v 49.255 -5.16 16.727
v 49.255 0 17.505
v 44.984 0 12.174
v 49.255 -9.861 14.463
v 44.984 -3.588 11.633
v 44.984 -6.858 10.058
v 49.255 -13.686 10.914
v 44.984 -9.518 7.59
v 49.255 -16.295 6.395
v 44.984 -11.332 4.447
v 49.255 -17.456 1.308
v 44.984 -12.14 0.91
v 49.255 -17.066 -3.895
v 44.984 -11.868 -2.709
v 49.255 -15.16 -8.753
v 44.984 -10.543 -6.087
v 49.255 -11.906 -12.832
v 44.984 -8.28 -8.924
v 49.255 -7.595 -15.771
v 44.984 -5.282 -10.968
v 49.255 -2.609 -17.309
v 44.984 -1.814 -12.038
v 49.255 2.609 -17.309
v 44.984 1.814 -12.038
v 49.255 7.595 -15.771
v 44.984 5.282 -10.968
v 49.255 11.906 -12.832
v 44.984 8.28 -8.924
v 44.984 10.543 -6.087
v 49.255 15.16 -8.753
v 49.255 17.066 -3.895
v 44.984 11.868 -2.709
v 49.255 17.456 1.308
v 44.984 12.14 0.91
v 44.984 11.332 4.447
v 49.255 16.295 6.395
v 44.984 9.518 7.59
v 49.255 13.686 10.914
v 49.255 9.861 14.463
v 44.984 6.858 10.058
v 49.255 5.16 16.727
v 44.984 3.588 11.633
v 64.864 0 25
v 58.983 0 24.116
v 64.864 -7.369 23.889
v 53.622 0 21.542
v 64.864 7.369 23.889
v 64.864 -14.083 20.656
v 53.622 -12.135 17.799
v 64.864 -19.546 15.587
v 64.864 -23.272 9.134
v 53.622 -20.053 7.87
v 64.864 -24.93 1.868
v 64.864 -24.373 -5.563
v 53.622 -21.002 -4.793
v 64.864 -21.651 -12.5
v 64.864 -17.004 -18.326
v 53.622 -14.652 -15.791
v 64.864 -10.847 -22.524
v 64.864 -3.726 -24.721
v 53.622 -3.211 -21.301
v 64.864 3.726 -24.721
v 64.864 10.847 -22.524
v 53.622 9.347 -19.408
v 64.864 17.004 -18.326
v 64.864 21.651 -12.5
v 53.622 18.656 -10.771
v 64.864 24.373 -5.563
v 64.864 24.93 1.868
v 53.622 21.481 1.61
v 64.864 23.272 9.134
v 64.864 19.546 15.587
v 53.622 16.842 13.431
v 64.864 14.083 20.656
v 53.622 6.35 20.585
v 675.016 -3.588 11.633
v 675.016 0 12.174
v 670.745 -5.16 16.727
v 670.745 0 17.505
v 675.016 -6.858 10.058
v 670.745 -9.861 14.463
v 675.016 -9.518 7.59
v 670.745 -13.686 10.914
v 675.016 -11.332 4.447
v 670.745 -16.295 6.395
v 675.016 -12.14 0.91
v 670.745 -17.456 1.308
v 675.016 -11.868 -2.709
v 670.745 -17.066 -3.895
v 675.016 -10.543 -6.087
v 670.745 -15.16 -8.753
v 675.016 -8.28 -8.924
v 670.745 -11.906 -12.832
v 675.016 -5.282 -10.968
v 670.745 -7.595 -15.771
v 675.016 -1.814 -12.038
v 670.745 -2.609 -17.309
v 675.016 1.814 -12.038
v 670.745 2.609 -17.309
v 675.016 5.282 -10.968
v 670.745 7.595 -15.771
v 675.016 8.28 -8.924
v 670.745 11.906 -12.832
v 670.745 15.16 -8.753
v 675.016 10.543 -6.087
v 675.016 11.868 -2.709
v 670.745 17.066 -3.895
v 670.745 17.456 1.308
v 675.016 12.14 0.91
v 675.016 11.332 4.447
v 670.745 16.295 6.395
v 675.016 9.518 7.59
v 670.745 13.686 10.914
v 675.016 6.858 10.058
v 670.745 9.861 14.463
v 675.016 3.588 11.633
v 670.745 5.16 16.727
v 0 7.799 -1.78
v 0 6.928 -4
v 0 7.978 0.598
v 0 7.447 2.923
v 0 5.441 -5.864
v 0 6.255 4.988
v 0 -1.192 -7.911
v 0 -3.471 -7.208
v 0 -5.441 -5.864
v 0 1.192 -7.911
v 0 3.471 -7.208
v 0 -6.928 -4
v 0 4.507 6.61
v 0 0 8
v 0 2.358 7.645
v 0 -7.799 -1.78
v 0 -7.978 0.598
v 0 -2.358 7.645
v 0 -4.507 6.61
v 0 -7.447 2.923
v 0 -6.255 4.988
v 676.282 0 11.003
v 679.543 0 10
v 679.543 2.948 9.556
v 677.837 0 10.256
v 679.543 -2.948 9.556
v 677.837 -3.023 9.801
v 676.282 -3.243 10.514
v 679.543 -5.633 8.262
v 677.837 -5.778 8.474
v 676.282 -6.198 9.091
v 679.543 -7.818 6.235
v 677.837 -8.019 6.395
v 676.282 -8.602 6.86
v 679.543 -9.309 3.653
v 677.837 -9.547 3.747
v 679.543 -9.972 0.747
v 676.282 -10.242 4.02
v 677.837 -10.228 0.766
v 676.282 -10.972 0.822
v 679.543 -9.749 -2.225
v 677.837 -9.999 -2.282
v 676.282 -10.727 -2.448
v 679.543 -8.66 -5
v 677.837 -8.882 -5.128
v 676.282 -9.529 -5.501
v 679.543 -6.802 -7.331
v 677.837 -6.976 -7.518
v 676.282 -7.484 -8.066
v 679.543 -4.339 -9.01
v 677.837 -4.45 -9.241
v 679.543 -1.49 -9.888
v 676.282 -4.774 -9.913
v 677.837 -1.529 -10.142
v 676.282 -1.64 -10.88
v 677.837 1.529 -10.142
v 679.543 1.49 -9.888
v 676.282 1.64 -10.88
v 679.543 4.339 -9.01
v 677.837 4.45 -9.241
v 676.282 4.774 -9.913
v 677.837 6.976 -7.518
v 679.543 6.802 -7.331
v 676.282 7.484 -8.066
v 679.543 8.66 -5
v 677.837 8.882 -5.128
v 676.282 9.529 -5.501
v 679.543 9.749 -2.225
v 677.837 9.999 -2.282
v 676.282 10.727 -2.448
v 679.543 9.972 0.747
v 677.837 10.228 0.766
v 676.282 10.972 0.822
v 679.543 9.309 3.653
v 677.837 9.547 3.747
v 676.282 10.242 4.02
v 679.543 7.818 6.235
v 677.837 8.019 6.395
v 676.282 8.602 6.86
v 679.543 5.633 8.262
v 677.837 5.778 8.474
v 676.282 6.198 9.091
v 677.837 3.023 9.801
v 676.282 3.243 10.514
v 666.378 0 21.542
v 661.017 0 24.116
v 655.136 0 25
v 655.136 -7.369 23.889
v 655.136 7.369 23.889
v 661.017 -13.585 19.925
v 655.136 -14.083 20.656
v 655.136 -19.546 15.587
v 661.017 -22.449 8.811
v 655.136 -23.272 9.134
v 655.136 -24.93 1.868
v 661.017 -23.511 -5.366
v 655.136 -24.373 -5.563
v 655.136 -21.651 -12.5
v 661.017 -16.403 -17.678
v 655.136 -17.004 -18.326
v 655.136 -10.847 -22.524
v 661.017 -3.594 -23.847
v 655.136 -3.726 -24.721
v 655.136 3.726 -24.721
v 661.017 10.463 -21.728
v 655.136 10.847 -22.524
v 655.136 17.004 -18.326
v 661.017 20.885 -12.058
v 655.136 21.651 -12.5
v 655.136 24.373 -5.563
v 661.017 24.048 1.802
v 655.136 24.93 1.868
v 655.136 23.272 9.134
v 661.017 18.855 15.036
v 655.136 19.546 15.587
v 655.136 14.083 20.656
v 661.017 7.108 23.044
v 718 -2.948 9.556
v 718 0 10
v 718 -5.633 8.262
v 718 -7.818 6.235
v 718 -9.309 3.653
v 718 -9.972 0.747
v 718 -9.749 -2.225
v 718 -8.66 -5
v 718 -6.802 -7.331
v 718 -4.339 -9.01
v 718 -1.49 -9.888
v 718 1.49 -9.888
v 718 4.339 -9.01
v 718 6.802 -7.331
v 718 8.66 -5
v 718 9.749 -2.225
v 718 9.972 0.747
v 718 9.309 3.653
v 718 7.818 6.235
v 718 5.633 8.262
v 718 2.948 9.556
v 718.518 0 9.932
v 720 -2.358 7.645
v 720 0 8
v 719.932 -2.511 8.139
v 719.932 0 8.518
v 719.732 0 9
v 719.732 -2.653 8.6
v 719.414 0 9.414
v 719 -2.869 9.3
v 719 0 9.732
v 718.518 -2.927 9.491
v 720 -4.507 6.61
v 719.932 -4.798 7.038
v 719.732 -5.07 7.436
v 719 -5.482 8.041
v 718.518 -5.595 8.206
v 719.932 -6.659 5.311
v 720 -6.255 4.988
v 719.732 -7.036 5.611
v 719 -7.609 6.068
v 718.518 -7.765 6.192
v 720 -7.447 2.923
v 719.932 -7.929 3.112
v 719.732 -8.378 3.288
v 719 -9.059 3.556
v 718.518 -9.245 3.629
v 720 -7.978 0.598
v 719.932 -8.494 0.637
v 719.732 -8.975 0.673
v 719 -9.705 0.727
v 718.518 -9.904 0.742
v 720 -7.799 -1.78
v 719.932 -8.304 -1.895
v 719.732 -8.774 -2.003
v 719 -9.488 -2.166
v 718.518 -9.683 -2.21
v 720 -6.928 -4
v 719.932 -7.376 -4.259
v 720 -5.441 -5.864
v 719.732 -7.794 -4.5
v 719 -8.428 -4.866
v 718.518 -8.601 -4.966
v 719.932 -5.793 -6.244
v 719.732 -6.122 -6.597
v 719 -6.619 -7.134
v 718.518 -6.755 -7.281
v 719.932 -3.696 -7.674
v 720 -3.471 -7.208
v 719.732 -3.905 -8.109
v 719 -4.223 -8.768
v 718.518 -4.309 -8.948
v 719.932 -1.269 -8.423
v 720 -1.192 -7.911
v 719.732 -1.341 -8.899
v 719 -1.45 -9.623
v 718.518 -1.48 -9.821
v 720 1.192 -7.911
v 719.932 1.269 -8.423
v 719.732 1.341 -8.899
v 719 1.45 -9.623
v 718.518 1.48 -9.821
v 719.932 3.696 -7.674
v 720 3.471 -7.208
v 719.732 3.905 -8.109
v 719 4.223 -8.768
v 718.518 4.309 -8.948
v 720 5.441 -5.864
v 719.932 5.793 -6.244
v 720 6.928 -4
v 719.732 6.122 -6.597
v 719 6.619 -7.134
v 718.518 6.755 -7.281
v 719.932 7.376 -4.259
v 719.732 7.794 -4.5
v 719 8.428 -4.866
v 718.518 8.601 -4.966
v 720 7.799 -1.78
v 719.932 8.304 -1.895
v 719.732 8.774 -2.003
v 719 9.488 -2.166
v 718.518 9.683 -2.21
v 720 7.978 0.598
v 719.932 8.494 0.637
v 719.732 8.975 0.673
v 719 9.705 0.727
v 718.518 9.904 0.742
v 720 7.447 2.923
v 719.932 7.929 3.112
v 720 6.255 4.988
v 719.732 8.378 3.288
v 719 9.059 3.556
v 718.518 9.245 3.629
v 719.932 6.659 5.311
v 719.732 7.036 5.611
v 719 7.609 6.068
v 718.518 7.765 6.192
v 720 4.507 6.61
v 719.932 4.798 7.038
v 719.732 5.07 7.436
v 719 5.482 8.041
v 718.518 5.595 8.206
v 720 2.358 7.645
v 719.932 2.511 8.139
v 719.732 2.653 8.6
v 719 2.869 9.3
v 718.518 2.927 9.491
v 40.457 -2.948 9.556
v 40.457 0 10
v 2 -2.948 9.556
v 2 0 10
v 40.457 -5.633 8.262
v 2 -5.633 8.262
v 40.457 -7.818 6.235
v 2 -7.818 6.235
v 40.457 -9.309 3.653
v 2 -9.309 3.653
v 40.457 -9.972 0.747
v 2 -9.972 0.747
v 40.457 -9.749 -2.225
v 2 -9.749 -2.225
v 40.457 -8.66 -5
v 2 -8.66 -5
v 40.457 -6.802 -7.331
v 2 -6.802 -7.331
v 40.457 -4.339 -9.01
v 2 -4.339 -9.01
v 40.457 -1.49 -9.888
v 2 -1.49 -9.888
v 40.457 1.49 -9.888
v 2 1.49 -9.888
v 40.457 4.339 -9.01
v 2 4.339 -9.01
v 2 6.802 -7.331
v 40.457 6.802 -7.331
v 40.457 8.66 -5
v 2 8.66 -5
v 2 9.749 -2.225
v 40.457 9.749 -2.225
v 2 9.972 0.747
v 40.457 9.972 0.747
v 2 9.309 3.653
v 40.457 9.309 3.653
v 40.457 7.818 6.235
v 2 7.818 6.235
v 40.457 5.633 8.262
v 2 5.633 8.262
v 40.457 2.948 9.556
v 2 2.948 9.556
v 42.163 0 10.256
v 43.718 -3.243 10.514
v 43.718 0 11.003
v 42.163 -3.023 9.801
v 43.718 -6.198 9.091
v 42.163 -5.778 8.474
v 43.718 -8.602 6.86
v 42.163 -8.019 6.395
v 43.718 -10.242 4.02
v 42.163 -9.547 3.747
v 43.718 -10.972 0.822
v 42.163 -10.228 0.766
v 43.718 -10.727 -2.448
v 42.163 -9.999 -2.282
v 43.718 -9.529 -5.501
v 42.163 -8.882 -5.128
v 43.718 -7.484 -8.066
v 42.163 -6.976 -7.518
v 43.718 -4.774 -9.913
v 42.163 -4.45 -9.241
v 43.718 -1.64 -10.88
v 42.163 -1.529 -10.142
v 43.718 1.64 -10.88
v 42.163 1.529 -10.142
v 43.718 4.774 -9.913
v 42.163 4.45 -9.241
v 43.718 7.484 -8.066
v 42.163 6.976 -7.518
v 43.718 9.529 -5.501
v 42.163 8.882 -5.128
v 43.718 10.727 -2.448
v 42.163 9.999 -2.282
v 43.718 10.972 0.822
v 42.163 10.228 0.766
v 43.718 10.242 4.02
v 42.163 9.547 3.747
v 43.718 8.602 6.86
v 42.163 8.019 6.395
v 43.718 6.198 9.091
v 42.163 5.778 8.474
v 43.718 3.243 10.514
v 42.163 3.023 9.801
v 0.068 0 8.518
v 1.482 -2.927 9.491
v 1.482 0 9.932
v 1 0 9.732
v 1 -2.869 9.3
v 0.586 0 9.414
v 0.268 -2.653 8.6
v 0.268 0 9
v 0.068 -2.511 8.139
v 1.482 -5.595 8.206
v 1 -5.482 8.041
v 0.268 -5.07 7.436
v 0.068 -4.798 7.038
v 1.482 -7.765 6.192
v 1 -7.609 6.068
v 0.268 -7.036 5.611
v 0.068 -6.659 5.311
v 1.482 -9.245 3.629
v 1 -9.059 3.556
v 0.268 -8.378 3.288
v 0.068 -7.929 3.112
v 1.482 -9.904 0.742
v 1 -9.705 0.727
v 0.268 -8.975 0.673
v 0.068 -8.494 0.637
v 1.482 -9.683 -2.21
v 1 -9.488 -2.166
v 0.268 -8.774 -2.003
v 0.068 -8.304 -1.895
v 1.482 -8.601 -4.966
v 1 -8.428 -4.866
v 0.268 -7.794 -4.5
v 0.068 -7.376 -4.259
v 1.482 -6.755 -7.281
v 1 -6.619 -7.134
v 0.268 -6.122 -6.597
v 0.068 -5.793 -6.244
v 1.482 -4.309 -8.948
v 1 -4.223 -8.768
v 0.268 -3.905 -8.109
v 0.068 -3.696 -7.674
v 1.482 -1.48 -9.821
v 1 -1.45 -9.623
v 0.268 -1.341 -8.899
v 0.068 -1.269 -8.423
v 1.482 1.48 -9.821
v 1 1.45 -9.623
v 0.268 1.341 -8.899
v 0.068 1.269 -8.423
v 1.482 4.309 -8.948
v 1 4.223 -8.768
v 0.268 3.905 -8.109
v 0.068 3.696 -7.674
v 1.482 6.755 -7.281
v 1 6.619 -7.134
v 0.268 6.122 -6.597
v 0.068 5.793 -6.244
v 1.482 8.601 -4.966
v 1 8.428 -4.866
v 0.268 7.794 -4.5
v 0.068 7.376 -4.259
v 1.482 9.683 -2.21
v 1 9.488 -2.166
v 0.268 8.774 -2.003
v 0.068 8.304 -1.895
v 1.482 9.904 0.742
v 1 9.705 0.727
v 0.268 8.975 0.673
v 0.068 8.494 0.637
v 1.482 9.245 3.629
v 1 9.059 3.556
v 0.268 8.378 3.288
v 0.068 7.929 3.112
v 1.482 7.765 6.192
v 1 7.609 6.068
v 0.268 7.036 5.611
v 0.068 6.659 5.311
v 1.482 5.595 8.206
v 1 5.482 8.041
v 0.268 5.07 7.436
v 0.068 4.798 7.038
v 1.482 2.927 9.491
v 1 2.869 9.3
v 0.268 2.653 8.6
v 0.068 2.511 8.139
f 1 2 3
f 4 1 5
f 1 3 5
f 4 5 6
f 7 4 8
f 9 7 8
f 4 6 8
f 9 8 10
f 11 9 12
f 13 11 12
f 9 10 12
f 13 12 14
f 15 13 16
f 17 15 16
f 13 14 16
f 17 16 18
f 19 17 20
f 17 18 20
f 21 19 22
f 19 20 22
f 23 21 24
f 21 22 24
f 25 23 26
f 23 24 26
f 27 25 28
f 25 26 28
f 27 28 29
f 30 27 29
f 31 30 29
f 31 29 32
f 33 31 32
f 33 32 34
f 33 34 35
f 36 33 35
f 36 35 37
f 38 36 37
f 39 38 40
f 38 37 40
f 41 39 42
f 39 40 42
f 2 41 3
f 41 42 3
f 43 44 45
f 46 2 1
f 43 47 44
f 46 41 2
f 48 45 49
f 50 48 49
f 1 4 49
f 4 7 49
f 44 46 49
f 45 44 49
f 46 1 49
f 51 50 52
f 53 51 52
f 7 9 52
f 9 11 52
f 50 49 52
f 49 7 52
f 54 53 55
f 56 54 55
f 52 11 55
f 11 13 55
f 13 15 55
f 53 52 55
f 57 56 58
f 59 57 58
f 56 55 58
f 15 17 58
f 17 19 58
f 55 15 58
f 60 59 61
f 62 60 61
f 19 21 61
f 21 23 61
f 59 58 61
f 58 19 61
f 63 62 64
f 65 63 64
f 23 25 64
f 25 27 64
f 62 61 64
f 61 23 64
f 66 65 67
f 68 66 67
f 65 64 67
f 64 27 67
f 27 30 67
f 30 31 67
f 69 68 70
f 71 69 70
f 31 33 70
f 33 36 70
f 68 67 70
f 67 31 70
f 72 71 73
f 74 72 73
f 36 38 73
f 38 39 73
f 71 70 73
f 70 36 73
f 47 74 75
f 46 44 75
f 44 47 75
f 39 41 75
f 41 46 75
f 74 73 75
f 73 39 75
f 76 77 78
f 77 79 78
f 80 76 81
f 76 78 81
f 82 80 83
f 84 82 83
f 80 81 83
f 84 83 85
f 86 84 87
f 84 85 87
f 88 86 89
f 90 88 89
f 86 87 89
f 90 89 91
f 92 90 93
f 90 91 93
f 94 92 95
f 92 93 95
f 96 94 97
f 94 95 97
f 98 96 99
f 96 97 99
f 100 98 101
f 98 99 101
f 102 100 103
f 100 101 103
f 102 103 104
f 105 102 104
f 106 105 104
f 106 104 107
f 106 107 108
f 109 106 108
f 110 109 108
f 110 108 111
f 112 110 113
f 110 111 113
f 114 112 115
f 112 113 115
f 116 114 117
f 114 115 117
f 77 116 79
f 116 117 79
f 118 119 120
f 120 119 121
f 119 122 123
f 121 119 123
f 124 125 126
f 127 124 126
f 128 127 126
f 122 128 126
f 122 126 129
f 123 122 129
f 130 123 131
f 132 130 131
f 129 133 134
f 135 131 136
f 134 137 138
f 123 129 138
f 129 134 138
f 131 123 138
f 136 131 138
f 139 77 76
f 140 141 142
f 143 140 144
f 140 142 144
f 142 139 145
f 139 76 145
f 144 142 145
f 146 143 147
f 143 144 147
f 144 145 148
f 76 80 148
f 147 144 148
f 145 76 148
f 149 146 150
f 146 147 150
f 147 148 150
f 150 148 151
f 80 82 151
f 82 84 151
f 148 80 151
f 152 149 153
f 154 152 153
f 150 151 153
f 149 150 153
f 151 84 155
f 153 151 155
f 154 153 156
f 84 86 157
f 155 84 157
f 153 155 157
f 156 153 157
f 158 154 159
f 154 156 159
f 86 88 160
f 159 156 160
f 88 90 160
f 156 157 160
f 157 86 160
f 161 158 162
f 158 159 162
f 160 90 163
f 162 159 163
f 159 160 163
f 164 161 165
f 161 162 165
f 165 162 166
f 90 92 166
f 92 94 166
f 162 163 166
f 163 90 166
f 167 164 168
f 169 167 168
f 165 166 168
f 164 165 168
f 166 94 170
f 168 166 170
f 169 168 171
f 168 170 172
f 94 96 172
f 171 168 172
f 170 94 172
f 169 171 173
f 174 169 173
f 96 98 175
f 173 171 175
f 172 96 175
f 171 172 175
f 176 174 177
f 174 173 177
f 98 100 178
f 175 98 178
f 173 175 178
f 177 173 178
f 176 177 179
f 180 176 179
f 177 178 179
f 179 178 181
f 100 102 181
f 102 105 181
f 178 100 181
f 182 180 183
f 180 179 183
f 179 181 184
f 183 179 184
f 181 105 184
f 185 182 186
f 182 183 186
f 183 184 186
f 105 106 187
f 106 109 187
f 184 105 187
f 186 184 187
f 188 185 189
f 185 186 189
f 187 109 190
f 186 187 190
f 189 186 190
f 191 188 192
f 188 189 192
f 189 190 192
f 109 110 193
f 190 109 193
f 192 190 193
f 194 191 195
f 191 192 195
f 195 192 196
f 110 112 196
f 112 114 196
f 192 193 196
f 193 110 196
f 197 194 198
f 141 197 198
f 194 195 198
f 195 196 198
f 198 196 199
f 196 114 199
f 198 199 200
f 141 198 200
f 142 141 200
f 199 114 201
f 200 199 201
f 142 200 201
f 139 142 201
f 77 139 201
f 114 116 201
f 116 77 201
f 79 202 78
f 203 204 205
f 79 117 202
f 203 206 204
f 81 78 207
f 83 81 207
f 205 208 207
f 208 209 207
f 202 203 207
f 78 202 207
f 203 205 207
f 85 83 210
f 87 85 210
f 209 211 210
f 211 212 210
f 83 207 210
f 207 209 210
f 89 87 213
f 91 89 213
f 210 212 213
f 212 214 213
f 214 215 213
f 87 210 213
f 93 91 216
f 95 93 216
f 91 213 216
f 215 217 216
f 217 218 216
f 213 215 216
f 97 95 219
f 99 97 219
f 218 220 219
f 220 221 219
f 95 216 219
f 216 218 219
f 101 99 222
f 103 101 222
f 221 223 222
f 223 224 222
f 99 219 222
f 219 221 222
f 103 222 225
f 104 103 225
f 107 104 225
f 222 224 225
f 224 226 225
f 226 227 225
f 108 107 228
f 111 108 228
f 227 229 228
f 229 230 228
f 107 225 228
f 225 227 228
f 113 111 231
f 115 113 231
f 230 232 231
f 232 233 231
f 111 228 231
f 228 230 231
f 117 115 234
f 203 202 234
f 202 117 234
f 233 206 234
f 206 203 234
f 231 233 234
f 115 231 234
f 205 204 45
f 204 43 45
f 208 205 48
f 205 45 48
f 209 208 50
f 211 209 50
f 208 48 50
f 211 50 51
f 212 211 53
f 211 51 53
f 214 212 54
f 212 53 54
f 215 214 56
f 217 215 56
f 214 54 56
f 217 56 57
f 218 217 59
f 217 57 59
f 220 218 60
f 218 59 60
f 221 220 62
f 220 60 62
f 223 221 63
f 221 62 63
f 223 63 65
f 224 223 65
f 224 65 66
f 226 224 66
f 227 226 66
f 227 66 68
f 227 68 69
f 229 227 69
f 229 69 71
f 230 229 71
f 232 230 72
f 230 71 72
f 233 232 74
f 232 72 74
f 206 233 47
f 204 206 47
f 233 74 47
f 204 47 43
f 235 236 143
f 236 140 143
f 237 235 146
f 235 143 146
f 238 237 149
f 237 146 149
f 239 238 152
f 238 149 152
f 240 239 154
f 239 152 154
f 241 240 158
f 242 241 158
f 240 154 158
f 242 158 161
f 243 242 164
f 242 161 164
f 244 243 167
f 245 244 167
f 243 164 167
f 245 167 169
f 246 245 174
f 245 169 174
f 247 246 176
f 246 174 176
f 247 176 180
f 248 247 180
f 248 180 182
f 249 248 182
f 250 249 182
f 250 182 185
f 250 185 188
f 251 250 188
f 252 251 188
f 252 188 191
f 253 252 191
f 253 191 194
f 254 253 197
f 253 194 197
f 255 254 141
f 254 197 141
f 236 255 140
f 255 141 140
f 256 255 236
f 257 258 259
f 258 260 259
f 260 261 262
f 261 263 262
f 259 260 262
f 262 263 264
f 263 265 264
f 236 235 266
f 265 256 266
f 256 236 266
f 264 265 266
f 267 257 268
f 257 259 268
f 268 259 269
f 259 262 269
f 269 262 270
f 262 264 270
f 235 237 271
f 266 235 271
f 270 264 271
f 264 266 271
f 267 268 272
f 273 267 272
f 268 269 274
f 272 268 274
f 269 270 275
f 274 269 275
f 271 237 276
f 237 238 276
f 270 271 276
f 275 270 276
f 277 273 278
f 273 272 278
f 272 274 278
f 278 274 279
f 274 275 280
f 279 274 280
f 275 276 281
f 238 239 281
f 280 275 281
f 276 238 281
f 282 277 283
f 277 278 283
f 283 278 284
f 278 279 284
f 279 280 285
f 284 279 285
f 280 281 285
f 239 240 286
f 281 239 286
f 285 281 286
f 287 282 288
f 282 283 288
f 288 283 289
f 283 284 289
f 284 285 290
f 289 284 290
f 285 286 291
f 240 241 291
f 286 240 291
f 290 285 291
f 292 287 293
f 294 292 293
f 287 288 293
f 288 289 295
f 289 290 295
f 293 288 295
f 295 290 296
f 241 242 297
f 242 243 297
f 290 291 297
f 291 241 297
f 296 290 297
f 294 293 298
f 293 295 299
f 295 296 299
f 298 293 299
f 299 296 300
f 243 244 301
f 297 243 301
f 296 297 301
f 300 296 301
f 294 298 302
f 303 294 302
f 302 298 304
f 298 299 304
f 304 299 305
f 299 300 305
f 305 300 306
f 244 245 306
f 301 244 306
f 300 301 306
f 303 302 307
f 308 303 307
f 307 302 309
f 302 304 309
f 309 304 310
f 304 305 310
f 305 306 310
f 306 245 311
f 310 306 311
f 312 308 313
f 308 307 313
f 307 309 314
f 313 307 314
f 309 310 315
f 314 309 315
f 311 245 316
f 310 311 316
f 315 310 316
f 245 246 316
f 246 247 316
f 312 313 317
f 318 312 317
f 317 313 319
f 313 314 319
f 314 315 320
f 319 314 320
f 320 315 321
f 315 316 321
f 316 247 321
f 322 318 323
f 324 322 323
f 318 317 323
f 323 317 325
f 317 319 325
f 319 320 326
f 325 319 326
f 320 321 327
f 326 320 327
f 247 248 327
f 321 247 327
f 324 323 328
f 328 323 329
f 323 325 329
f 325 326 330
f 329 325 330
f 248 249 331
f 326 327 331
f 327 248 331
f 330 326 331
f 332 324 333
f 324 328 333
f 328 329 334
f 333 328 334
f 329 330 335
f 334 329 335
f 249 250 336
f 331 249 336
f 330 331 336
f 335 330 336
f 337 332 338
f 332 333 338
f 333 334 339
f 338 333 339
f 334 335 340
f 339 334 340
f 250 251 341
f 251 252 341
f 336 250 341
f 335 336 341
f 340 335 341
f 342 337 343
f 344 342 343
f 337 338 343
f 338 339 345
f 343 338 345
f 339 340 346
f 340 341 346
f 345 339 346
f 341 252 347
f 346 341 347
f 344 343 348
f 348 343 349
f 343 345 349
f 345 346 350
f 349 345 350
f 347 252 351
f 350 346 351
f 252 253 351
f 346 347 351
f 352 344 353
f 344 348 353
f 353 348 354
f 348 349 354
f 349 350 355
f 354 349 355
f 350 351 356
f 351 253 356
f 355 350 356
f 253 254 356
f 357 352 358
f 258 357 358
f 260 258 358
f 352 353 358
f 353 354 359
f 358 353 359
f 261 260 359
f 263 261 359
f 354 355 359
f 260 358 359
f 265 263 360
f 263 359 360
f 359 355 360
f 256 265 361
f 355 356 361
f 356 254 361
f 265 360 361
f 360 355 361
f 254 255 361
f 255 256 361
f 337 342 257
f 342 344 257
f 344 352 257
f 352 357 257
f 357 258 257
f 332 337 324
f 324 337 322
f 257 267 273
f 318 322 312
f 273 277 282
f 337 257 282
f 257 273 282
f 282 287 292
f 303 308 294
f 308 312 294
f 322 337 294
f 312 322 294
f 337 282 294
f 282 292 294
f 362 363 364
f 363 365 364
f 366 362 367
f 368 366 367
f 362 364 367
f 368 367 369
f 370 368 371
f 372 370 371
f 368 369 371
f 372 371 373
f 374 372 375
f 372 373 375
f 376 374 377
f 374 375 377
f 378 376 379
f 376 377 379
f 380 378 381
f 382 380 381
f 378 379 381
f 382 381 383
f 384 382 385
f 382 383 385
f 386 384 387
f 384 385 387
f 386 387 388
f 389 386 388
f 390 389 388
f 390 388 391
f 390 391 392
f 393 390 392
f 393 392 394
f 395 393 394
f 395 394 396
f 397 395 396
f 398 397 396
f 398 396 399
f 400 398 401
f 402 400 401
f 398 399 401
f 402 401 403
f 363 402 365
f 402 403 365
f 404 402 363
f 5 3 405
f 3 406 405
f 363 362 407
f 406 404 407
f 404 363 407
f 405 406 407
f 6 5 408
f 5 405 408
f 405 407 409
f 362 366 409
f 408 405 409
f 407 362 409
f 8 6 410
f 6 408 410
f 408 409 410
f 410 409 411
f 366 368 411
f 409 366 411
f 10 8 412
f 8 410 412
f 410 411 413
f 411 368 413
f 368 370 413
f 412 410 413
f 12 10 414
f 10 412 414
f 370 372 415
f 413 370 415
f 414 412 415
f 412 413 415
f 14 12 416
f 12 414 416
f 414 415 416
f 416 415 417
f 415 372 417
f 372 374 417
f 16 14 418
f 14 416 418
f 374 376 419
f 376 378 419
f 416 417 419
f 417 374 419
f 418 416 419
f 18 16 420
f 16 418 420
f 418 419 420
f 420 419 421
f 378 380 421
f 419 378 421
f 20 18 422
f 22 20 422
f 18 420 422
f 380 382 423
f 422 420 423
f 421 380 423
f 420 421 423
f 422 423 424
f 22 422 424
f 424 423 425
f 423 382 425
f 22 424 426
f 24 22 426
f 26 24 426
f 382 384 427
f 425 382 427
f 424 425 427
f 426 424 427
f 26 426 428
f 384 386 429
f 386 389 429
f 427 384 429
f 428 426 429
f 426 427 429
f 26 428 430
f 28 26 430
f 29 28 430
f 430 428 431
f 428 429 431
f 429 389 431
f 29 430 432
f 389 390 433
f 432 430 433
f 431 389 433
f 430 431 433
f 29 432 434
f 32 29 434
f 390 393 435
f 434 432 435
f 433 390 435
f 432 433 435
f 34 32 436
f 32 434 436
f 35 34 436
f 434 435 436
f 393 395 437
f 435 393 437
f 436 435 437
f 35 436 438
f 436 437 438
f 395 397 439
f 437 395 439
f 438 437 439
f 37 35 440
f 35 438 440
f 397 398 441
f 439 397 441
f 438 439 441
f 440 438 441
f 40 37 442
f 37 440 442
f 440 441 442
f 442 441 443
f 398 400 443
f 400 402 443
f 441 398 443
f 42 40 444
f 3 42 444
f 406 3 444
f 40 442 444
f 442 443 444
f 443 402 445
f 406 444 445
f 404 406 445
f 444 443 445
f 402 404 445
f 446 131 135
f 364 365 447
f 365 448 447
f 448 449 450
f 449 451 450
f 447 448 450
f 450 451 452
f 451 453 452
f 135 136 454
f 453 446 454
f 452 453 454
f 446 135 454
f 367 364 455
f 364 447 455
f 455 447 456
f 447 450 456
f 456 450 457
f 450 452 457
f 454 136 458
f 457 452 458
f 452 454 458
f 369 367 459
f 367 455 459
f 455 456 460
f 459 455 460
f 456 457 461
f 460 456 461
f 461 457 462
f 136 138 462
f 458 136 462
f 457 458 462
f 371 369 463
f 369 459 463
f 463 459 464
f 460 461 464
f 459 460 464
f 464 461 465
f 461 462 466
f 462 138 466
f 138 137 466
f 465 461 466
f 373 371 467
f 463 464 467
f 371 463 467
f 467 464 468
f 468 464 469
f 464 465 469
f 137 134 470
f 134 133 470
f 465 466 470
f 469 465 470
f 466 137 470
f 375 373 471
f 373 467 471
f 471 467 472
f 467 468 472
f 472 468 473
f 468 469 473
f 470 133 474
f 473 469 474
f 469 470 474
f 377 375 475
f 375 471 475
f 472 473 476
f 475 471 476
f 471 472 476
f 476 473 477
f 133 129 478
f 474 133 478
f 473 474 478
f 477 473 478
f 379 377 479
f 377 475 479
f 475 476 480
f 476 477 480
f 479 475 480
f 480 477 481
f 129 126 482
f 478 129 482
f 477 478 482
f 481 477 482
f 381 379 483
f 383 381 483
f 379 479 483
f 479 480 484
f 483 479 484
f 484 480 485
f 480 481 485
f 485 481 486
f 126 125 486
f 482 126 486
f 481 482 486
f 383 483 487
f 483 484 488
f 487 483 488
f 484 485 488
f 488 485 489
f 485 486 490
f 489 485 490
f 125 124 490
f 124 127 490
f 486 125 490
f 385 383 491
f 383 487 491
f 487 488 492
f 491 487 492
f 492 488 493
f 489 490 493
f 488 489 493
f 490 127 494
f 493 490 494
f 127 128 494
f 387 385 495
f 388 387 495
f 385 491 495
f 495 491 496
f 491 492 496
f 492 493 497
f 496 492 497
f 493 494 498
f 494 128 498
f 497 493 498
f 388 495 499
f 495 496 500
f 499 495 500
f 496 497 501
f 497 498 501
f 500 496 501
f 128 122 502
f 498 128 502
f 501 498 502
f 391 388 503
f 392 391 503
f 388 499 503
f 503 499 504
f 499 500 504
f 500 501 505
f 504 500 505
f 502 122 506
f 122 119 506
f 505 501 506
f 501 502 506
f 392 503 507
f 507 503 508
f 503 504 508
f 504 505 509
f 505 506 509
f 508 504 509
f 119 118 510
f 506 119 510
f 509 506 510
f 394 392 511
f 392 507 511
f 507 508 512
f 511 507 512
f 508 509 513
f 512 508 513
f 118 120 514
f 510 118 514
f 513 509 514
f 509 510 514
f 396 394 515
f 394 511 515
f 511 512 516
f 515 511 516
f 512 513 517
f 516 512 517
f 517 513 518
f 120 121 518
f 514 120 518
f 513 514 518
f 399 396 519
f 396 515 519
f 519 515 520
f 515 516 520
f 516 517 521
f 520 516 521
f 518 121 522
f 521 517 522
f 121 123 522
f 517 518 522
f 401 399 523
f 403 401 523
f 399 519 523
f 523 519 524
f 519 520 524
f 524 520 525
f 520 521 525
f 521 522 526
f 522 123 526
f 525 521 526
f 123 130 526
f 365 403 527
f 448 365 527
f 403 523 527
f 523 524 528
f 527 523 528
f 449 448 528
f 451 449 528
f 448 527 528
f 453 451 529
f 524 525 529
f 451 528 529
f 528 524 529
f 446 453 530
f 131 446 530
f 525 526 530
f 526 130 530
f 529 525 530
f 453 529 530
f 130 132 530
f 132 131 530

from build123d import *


with BuildPart() as f1:
    # F0 (on Front) → F1 (revolve)
    with BuildSketch(Plane.XZ):
        with BuildLine():
            Line((0, 8), (0, 0))
            Line((0, 0), (360, 0))
            Line((360, 0), (720, 0))
            Line((720, 0), (720, 8))
            ThreePointArc((720, 8), (719.414214, 9.414214), (718, 10))
            Line((718, 10), (679.542538, 10))
            ThreePointArc((679.542538, 10), (677.031904, 10.571547), (675.016079, 12.173546))
            Line((675.016079, 12.173546), (670.744676, 17.505015))
            ThreePointArc((670.744676, 17.505015), (663.793556, 23.029147), (655.136198, 25))
            Line((655.136198, 25), (360, 25))
            Line((360, 25), (64.863802, 25))
            ThreePointArc((64.863802, 25), (56.206444, 23.029147), (49.255324, 17.505015))
            Line((49.255324, 17.505015), (44.983921, 12.173546))
            ThreePointArc((44.983921, 12.173546), (42.968096, 10.571547), (40.457462, 10))
            Line((40.457462, 10), (2, 10))
            ThreePointArc((2, 10), (0.585786, 9.414214), (0, 8))
        make_face()
    revolve(axis=Axis((180, 0, 0), (1, 0, 0)))


solid = f1.part
